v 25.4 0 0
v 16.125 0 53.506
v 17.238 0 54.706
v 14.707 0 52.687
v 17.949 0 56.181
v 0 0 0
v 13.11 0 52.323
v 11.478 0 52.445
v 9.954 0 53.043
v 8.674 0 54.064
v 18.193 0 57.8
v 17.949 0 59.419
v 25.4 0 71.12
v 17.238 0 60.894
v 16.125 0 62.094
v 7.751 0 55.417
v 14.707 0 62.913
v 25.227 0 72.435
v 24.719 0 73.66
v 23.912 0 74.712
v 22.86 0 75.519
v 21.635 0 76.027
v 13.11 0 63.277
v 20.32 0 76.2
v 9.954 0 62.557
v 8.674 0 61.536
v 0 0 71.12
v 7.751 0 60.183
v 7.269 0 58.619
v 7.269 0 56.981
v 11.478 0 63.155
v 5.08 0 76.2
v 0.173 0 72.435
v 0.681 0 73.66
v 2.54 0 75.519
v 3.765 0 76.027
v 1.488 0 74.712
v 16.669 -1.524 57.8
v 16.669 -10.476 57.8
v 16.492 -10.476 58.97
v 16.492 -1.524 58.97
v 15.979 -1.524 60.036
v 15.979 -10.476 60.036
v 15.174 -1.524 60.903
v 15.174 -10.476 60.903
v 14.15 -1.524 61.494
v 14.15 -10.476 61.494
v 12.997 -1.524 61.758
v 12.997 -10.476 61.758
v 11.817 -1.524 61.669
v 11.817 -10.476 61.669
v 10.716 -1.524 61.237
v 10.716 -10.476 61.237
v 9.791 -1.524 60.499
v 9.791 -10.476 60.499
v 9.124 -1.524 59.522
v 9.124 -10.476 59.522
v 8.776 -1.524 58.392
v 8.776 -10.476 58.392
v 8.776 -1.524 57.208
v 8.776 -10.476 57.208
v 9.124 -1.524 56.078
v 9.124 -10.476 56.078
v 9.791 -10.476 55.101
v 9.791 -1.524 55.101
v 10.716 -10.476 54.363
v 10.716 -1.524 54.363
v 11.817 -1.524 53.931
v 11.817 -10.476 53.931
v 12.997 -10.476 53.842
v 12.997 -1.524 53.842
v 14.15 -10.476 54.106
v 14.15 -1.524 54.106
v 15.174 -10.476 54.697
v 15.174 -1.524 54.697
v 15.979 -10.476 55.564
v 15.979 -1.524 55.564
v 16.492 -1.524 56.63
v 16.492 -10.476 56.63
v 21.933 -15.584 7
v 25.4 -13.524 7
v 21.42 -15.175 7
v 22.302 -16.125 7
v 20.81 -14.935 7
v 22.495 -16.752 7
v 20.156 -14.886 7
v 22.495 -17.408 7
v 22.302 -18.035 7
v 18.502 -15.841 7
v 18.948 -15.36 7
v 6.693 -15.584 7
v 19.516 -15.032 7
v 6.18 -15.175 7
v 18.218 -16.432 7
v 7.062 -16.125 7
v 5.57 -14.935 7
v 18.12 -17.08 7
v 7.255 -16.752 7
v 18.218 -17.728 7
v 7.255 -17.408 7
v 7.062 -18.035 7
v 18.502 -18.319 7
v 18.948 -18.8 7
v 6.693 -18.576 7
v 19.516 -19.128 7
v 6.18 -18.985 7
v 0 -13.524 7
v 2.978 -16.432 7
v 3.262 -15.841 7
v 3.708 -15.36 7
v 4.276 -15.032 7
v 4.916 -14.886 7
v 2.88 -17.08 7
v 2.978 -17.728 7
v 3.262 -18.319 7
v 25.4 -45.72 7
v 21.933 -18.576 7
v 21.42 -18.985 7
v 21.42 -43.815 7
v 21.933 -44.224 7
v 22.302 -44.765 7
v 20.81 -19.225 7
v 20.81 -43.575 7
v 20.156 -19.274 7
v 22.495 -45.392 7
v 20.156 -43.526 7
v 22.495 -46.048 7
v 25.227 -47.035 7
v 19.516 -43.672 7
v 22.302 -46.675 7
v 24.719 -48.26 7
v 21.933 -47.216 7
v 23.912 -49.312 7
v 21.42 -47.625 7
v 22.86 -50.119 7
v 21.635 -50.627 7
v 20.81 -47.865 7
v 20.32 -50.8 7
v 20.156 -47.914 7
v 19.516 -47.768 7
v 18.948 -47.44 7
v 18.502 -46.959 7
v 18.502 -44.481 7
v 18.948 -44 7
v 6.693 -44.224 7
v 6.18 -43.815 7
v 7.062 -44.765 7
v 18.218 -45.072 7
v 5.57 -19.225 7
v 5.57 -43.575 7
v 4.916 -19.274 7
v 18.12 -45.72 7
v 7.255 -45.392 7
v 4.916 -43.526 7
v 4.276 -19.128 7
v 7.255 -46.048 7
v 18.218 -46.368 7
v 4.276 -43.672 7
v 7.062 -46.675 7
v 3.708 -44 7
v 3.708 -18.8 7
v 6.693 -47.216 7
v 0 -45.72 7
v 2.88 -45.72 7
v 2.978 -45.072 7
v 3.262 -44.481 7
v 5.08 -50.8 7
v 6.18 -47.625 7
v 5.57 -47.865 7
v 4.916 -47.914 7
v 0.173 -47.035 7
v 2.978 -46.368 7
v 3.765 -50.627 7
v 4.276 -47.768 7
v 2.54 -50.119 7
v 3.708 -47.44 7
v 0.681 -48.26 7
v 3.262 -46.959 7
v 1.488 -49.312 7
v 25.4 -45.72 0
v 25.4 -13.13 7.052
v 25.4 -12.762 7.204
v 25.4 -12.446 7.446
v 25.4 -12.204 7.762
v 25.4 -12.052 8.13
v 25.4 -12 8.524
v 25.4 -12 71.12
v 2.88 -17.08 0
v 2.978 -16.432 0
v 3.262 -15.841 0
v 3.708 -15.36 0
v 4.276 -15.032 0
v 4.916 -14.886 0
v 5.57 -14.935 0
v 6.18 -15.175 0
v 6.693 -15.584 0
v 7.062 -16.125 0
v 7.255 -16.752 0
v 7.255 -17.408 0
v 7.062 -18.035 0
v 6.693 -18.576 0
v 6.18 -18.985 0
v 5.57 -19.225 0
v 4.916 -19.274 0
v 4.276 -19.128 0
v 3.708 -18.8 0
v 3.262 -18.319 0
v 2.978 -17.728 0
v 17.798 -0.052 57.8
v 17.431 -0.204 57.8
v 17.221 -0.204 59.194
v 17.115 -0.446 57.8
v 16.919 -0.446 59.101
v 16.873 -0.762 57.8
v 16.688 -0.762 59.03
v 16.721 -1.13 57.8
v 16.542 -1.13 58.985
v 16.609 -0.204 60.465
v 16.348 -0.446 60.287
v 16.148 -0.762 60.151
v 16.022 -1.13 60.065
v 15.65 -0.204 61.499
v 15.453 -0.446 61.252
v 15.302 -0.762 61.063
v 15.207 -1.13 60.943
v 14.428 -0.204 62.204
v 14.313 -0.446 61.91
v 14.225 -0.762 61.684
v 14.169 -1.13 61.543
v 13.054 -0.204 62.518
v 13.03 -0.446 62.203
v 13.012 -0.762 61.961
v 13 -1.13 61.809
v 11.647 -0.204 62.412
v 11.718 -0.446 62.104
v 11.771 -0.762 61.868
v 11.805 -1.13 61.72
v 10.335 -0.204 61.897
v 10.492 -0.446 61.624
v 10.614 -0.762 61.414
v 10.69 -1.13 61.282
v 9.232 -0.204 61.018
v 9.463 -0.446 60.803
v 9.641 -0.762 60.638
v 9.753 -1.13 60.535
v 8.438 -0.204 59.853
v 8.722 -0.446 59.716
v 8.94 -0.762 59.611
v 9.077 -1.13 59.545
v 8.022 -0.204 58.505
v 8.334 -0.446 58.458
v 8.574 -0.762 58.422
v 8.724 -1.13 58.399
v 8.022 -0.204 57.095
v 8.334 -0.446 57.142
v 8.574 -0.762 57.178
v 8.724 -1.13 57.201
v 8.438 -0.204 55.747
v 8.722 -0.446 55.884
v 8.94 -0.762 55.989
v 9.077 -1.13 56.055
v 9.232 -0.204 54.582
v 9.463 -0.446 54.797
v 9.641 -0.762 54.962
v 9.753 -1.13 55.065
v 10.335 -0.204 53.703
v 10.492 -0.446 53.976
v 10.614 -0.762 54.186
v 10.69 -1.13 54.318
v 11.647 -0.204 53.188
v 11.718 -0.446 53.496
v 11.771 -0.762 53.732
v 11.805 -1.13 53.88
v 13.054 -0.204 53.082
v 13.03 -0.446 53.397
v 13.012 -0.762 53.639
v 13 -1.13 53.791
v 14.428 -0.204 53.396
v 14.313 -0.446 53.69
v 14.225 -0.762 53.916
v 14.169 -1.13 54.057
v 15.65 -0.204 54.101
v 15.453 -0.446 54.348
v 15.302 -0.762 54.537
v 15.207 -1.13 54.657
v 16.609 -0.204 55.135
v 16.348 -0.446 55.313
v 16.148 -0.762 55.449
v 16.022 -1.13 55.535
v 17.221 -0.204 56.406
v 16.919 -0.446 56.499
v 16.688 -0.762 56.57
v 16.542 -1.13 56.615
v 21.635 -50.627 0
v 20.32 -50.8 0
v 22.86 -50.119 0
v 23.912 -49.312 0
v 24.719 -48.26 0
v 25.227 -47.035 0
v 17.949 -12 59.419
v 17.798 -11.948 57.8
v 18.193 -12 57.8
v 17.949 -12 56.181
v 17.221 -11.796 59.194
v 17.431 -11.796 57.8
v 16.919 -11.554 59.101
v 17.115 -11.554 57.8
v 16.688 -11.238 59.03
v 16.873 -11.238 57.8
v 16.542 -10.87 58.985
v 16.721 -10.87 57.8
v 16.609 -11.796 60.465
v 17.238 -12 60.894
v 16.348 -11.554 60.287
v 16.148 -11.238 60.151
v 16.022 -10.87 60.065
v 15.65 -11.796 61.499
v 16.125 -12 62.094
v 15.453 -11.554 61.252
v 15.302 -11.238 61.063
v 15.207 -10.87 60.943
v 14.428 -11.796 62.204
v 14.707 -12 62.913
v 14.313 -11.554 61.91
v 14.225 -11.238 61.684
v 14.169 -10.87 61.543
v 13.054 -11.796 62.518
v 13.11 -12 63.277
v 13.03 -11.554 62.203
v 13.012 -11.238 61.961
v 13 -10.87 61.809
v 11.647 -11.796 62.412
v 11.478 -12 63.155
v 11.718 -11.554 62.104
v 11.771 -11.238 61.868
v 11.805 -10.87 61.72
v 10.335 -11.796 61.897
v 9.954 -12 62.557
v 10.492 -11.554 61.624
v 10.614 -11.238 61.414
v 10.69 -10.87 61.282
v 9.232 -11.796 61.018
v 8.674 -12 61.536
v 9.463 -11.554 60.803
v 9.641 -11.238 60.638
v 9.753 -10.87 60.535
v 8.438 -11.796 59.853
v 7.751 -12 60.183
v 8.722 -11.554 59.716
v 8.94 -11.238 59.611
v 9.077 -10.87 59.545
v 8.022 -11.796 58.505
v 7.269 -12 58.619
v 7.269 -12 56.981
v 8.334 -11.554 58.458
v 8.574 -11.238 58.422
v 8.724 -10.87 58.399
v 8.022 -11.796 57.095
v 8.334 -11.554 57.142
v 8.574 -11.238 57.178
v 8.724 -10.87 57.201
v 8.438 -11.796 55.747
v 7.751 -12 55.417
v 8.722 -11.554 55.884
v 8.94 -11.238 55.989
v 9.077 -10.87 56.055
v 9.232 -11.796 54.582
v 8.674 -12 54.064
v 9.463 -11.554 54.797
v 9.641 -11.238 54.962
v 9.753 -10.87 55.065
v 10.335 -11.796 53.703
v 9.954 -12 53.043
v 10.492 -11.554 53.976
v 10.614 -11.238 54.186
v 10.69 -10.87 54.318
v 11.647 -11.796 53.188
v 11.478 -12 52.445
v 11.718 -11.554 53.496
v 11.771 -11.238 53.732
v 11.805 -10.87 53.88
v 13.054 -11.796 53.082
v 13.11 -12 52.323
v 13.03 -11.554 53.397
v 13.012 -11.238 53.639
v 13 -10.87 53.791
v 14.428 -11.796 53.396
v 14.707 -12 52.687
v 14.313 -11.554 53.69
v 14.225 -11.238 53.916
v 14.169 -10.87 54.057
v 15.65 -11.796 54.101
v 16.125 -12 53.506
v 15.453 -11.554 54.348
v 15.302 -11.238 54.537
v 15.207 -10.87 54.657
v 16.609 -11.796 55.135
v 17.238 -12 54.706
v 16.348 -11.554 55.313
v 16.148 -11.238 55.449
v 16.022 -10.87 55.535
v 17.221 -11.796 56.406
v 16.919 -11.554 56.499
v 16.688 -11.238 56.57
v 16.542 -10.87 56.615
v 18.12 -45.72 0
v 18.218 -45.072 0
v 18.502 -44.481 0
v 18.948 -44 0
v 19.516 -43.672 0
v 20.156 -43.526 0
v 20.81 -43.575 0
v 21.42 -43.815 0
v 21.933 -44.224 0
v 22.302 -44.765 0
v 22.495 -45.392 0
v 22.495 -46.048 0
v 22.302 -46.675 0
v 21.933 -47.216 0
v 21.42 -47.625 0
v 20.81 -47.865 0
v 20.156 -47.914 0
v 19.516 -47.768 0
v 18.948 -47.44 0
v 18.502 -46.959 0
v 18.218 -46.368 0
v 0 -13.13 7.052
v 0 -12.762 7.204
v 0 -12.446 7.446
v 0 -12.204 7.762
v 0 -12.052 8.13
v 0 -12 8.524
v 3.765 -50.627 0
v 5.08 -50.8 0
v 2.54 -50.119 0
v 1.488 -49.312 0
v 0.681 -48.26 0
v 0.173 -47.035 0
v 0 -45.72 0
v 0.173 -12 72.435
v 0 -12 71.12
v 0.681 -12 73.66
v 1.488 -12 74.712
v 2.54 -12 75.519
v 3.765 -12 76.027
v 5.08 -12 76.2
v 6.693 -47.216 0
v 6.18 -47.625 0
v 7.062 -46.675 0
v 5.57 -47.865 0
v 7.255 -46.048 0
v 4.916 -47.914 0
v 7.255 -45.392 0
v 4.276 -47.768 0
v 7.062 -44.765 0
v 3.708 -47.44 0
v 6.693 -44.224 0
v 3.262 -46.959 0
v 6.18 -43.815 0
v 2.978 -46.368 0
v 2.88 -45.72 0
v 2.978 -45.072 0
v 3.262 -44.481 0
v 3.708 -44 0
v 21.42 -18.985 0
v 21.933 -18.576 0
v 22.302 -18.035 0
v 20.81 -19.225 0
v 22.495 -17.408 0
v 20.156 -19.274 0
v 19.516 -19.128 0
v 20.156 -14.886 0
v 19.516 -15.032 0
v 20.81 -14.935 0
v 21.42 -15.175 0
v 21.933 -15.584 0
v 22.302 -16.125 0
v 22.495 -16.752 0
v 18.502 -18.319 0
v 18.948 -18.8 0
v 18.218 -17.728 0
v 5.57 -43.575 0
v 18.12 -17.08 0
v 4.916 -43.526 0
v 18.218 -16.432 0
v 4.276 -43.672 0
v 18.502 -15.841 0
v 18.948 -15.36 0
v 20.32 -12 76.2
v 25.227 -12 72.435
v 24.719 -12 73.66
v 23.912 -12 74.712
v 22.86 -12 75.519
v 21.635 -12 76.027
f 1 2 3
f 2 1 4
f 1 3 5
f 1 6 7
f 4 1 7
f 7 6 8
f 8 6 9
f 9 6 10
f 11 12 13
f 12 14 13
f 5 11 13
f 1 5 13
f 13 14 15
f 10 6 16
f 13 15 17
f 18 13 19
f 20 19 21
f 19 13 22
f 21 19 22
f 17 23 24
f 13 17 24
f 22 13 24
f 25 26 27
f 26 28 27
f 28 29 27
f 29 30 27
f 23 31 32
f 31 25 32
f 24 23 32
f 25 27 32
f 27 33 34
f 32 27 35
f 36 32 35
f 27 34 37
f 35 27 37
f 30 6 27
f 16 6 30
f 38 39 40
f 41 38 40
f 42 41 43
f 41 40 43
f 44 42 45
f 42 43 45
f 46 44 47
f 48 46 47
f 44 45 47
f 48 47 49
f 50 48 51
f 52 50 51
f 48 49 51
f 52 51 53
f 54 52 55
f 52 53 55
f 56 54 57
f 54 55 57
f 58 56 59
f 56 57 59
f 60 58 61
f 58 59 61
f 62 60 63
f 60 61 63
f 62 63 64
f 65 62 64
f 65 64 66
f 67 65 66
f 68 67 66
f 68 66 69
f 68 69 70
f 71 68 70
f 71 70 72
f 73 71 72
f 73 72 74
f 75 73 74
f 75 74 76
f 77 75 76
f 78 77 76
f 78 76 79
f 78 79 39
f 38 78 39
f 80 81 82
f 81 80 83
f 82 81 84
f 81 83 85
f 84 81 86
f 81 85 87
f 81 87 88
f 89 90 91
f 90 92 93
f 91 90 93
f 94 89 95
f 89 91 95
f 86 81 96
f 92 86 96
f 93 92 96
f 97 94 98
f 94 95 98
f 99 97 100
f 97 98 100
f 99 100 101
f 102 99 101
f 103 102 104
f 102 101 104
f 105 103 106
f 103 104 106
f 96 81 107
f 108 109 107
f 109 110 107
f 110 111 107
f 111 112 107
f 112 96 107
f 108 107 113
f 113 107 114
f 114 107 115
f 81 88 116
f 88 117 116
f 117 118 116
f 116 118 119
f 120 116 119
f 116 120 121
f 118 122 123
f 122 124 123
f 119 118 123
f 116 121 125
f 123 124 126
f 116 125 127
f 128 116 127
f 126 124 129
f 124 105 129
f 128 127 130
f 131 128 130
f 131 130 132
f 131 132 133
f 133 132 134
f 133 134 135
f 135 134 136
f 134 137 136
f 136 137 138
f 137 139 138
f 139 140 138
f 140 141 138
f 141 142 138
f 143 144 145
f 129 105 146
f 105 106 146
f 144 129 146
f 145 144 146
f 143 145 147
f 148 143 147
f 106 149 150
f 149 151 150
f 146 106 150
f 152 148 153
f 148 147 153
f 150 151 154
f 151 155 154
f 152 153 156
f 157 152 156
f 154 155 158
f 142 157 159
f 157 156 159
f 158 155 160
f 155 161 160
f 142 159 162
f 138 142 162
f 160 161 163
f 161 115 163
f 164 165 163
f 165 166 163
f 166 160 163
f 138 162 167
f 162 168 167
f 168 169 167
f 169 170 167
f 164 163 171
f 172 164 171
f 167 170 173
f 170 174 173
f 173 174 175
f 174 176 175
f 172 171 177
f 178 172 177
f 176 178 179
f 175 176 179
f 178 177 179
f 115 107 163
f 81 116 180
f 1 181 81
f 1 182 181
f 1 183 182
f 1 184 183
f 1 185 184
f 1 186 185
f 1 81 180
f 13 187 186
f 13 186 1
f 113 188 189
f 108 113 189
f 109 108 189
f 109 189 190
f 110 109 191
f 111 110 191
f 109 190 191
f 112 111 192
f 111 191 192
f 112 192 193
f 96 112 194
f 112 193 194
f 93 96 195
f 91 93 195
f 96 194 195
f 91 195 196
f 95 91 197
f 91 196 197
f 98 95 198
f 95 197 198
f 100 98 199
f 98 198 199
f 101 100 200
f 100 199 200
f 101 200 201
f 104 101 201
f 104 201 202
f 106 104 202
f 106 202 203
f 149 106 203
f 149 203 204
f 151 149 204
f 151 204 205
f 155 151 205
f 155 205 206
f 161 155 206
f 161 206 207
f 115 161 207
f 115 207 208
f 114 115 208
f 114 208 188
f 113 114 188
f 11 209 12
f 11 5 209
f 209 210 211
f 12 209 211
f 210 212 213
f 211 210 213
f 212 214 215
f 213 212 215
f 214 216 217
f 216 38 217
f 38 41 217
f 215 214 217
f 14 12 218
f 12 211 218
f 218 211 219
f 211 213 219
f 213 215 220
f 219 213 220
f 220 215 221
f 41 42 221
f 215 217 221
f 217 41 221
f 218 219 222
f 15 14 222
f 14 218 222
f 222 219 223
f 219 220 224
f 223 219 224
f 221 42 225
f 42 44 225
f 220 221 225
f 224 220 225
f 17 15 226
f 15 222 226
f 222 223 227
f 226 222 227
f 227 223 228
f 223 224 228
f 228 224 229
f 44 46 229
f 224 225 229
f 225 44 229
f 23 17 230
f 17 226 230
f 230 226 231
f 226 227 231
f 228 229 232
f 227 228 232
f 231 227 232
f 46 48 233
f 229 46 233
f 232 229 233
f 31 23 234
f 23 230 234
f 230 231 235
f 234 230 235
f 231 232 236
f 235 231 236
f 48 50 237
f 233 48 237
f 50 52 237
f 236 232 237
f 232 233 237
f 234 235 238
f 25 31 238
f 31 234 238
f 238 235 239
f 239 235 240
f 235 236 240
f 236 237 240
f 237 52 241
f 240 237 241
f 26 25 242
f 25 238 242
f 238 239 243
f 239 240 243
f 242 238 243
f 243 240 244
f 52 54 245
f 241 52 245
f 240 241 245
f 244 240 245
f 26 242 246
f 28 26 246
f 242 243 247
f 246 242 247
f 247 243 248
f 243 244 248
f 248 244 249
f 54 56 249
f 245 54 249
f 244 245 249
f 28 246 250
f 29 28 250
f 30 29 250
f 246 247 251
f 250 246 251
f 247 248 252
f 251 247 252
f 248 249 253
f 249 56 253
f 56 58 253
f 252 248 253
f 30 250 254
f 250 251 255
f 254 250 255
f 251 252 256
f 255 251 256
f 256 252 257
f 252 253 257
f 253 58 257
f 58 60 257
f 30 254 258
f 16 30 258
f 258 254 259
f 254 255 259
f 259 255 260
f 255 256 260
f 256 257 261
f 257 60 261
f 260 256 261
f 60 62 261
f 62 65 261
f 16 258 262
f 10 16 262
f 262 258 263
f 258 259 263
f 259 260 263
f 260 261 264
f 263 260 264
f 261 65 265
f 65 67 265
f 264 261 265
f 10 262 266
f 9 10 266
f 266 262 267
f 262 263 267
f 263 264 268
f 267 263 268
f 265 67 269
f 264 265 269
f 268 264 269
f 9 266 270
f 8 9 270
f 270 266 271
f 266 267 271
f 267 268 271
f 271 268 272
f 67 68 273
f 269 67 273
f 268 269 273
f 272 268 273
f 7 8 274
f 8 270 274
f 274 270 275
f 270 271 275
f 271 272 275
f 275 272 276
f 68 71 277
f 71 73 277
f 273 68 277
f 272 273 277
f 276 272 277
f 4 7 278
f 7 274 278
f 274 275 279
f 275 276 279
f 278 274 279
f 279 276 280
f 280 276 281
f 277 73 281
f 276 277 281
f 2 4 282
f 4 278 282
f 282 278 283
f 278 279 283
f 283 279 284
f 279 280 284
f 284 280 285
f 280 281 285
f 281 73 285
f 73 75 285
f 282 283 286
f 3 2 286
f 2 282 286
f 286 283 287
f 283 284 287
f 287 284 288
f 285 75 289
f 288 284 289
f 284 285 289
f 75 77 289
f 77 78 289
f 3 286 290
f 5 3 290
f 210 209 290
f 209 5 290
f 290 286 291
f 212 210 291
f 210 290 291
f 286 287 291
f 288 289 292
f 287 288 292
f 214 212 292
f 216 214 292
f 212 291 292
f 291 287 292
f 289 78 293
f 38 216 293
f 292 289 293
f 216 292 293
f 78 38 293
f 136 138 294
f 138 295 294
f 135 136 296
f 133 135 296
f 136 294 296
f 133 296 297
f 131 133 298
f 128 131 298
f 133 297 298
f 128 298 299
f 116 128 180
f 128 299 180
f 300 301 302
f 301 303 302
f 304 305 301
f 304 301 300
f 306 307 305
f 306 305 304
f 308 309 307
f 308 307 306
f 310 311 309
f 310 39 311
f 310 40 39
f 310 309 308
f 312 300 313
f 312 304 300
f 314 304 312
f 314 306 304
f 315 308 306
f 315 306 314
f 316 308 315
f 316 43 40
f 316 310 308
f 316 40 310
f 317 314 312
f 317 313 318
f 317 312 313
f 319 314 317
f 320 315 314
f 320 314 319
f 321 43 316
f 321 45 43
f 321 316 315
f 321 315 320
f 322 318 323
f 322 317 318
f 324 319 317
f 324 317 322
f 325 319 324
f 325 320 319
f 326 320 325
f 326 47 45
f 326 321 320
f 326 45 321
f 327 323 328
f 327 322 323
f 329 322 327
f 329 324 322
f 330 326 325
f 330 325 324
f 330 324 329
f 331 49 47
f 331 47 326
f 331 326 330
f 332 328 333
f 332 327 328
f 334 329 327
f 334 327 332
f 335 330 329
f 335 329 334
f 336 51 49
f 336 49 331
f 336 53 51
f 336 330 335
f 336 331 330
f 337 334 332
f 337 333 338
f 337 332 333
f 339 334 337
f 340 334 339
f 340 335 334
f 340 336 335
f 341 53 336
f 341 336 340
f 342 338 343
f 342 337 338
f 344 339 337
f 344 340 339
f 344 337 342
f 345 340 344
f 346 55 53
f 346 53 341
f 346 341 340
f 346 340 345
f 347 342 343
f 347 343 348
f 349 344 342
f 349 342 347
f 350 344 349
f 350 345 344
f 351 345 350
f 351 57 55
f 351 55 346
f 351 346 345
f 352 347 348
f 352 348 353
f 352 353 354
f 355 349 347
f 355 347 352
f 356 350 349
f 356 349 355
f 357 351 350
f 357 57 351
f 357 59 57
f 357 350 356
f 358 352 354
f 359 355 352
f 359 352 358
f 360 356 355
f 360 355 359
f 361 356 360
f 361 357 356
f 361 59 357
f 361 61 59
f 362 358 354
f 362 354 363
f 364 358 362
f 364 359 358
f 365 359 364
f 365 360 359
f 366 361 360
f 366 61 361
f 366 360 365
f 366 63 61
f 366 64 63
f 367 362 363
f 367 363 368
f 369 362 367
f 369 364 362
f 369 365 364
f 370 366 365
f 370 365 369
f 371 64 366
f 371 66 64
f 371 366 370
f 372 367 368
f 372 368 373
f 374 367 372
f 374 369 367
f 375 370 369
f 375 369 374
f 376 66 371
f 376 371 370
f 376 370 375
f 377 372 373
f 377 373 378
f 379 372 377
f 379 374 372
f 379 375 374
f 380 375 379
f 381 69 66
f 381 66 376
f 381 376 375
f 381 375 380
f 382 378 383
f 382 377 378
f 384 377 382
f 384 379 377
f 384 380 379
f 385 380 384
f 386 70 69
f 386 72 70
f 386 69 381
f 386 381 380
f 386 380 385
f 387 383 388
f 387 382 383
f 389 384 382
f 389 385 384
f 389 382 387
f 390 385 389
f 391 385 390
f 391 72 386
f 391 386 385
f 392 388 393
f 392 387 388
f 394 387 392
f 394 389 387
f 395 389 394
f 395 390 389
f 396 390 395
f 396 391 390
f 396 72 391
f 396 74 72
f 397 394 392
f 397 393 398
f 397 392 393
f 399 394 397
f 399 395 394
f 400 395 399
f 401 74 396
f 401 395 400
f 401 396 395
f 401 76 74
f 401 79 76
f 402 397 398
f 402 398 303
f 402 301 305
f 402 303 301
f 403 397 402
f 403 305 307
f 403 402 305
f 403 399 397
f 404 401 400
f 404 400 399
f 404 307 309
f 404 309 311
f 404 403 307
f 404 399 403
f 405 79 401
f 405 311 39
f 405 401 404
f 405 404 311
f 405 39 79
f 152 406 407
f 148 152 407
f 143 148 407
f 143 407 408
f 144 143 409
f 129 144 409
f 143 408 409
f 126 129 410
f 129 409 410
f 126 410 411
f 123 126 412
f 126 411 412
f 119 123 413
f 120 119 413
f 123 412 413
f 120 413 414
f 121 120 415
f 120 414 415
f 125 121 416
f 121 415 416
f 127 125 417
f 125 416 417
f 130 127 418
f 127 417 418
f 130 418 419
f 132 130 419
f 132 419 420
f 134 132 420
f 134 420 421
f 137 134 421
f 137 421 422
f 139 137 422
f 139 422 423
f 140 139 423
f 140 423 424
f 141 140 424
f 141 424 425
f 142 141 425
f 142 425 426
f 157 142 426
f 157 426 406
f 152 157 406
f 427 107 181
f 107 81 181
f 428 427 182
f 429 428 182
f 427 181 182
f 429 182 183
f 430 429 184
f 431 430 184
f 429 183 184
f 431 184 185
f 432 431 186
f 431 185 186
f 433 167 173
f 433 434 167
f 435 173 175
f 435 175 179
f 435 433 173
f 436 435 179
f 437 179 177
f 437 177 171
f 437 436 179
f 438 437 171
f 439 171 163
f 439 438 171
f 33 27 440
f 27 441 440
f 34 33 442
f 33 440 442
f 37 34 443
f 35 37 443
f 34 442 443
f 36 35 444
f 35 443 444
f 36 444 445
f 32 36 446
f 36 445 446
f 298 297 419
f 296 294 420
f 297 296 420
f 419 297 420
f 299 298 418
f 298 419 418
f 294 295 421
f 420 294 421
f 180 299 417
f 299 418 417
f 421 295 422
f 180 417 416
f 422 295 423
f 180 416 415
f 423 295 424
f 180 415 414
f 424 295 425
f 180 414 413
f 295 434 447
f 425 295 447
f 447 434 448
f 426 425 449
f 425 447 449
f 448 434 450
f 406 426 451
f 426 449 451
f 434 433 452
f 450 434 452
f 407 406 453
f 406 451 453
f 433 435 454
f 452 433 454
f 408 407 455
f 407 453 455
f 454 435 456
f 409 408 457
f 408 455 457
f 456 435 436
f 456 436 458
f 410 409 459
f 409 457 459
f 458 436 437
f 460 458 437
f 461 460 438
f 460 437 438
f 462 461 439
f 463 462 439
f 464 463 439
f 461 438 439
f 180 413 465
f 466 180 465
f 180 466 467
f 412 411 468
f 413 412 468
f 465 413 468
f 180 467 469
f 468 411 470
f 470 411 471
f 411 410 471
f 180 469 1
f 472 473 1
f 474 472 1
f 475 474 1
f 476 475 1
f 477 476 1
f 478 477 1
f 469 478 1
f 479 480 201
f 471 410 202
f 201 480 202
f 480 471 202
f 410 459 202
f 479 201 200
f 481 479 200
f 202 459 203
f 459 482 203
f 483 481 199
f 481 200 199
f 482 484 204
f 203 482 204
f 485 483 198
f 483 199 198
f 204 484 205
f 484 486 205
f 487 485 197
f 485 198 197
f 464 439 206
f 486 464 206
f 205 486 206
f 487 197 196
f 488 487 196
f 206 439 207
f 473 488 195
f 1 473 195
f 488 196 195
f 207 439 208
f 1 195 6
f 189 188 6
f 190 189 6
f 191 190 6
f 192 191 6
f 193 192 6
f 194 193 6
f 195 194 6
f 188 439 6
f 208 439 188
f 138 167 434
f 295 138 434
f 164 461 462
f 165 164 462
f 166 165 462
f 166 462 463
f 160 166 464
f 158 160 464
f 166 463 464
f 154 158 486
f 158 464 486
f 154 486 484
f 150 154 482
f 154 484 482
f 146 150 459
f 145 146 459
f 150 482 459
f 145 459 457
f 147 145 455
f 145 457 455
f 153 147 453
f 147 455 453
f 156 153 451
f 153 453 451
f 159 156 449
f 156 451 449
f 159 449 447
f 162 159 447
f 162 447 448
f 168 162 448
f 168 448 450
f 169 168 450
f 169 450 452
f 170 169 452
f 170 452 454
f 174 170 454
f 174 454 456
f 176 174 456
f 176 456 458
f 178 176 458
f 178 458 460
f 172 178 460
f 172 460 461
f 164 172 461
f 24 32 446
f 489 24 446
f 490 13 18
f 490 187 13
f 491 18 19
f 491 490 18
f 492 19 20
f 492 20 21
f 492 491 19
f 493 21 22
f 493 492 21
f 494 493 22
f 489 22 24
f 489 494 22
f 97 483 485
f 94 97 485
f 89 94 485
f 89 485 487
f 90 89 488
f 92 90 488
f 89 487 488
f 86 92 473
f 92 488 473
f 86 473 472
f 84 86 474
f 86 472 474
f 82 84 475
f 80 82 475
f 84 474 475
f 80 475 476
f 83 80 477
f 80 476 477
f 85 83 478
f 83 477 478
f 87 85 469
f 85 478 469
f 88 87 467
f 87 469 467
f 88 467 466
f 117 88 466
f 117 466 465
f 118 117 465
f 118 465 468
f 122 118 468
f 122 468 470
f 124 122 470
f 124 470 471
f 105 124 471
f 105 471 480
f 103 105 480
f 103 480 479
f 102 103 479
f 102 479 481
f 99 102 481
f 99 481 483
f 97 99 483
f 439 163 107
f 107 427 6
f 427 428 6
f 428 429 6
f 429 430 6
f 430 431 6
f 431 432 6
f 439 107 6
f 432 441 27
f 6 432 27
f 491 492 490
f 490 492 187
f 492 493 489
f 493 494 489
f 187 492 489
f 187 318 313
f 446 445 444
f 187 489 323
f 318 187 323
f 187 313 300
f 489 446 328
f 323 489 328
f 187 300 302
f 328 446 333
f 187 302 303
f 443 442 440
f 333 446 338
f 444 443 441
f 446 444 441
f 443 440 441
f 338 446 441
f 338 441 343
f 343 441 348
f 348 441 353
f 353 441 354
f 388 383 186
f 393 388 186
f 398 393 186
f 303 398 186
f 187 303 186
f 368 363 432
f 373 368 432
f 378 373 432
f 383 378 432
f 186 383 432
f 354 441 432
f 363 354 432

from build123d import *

# Parameters (mm, degrees)
F1_DEPTH = 25.4
F3_D     = 4.4
F4_R     = 3.96875
F5_DEPTH = 25.4
F6_R     = 5.08
F7_R     = 1.524


with BuildPart() as f1:
    # F0 (on Right) → F1 (new body)
    with BuildSketch(Plane.YZ):
        Polygon((-50.8, 7), (-50.8, 0), (0, 0), (0, 76.2), (-12, 76.2), (-12, 7), align=None)
    extrude(amount=F1_DEPTH)

    # F3 (through all)
    with Locations(Plane.XY.offset(7)):
        with Locations((20.32, -17.08), (5.08, -17.08), (5.08, -45.72), (20.32, -45.72)):
            Hole(F3_D / 2)

    # F4 (on face) → F5 (cut)
    with BuildSketch(Plane.XZ.offset(12)):
        with Locations((12.7, 57.8)):
            Circle(F4_R)
    extrude(amount=-F5_DEPTH, mode=Mode.SUBTRACT)

    # F6
    f6_edges = [f1.edges().sort_by_distance(p)[0] for p in [
        (25.4, -6, 76.2),
        (0, -6, 76.2),
        (25.4, -50.8, 3.5),
        (0, -50.8, 3.5),
    ]]
    fillet(f6_edges, radius=F6_R)

    # F7
    f7_edges = [f1.edges().sort_by_distance(p)[0] for p in [
        (12.7, -12, 7),
        (8.73125, -12, 57.8),
        (8.73125, 0, 57.8),
    ]]
    fillet(f7_edges, radius=F7_R)


solid = f1.part
